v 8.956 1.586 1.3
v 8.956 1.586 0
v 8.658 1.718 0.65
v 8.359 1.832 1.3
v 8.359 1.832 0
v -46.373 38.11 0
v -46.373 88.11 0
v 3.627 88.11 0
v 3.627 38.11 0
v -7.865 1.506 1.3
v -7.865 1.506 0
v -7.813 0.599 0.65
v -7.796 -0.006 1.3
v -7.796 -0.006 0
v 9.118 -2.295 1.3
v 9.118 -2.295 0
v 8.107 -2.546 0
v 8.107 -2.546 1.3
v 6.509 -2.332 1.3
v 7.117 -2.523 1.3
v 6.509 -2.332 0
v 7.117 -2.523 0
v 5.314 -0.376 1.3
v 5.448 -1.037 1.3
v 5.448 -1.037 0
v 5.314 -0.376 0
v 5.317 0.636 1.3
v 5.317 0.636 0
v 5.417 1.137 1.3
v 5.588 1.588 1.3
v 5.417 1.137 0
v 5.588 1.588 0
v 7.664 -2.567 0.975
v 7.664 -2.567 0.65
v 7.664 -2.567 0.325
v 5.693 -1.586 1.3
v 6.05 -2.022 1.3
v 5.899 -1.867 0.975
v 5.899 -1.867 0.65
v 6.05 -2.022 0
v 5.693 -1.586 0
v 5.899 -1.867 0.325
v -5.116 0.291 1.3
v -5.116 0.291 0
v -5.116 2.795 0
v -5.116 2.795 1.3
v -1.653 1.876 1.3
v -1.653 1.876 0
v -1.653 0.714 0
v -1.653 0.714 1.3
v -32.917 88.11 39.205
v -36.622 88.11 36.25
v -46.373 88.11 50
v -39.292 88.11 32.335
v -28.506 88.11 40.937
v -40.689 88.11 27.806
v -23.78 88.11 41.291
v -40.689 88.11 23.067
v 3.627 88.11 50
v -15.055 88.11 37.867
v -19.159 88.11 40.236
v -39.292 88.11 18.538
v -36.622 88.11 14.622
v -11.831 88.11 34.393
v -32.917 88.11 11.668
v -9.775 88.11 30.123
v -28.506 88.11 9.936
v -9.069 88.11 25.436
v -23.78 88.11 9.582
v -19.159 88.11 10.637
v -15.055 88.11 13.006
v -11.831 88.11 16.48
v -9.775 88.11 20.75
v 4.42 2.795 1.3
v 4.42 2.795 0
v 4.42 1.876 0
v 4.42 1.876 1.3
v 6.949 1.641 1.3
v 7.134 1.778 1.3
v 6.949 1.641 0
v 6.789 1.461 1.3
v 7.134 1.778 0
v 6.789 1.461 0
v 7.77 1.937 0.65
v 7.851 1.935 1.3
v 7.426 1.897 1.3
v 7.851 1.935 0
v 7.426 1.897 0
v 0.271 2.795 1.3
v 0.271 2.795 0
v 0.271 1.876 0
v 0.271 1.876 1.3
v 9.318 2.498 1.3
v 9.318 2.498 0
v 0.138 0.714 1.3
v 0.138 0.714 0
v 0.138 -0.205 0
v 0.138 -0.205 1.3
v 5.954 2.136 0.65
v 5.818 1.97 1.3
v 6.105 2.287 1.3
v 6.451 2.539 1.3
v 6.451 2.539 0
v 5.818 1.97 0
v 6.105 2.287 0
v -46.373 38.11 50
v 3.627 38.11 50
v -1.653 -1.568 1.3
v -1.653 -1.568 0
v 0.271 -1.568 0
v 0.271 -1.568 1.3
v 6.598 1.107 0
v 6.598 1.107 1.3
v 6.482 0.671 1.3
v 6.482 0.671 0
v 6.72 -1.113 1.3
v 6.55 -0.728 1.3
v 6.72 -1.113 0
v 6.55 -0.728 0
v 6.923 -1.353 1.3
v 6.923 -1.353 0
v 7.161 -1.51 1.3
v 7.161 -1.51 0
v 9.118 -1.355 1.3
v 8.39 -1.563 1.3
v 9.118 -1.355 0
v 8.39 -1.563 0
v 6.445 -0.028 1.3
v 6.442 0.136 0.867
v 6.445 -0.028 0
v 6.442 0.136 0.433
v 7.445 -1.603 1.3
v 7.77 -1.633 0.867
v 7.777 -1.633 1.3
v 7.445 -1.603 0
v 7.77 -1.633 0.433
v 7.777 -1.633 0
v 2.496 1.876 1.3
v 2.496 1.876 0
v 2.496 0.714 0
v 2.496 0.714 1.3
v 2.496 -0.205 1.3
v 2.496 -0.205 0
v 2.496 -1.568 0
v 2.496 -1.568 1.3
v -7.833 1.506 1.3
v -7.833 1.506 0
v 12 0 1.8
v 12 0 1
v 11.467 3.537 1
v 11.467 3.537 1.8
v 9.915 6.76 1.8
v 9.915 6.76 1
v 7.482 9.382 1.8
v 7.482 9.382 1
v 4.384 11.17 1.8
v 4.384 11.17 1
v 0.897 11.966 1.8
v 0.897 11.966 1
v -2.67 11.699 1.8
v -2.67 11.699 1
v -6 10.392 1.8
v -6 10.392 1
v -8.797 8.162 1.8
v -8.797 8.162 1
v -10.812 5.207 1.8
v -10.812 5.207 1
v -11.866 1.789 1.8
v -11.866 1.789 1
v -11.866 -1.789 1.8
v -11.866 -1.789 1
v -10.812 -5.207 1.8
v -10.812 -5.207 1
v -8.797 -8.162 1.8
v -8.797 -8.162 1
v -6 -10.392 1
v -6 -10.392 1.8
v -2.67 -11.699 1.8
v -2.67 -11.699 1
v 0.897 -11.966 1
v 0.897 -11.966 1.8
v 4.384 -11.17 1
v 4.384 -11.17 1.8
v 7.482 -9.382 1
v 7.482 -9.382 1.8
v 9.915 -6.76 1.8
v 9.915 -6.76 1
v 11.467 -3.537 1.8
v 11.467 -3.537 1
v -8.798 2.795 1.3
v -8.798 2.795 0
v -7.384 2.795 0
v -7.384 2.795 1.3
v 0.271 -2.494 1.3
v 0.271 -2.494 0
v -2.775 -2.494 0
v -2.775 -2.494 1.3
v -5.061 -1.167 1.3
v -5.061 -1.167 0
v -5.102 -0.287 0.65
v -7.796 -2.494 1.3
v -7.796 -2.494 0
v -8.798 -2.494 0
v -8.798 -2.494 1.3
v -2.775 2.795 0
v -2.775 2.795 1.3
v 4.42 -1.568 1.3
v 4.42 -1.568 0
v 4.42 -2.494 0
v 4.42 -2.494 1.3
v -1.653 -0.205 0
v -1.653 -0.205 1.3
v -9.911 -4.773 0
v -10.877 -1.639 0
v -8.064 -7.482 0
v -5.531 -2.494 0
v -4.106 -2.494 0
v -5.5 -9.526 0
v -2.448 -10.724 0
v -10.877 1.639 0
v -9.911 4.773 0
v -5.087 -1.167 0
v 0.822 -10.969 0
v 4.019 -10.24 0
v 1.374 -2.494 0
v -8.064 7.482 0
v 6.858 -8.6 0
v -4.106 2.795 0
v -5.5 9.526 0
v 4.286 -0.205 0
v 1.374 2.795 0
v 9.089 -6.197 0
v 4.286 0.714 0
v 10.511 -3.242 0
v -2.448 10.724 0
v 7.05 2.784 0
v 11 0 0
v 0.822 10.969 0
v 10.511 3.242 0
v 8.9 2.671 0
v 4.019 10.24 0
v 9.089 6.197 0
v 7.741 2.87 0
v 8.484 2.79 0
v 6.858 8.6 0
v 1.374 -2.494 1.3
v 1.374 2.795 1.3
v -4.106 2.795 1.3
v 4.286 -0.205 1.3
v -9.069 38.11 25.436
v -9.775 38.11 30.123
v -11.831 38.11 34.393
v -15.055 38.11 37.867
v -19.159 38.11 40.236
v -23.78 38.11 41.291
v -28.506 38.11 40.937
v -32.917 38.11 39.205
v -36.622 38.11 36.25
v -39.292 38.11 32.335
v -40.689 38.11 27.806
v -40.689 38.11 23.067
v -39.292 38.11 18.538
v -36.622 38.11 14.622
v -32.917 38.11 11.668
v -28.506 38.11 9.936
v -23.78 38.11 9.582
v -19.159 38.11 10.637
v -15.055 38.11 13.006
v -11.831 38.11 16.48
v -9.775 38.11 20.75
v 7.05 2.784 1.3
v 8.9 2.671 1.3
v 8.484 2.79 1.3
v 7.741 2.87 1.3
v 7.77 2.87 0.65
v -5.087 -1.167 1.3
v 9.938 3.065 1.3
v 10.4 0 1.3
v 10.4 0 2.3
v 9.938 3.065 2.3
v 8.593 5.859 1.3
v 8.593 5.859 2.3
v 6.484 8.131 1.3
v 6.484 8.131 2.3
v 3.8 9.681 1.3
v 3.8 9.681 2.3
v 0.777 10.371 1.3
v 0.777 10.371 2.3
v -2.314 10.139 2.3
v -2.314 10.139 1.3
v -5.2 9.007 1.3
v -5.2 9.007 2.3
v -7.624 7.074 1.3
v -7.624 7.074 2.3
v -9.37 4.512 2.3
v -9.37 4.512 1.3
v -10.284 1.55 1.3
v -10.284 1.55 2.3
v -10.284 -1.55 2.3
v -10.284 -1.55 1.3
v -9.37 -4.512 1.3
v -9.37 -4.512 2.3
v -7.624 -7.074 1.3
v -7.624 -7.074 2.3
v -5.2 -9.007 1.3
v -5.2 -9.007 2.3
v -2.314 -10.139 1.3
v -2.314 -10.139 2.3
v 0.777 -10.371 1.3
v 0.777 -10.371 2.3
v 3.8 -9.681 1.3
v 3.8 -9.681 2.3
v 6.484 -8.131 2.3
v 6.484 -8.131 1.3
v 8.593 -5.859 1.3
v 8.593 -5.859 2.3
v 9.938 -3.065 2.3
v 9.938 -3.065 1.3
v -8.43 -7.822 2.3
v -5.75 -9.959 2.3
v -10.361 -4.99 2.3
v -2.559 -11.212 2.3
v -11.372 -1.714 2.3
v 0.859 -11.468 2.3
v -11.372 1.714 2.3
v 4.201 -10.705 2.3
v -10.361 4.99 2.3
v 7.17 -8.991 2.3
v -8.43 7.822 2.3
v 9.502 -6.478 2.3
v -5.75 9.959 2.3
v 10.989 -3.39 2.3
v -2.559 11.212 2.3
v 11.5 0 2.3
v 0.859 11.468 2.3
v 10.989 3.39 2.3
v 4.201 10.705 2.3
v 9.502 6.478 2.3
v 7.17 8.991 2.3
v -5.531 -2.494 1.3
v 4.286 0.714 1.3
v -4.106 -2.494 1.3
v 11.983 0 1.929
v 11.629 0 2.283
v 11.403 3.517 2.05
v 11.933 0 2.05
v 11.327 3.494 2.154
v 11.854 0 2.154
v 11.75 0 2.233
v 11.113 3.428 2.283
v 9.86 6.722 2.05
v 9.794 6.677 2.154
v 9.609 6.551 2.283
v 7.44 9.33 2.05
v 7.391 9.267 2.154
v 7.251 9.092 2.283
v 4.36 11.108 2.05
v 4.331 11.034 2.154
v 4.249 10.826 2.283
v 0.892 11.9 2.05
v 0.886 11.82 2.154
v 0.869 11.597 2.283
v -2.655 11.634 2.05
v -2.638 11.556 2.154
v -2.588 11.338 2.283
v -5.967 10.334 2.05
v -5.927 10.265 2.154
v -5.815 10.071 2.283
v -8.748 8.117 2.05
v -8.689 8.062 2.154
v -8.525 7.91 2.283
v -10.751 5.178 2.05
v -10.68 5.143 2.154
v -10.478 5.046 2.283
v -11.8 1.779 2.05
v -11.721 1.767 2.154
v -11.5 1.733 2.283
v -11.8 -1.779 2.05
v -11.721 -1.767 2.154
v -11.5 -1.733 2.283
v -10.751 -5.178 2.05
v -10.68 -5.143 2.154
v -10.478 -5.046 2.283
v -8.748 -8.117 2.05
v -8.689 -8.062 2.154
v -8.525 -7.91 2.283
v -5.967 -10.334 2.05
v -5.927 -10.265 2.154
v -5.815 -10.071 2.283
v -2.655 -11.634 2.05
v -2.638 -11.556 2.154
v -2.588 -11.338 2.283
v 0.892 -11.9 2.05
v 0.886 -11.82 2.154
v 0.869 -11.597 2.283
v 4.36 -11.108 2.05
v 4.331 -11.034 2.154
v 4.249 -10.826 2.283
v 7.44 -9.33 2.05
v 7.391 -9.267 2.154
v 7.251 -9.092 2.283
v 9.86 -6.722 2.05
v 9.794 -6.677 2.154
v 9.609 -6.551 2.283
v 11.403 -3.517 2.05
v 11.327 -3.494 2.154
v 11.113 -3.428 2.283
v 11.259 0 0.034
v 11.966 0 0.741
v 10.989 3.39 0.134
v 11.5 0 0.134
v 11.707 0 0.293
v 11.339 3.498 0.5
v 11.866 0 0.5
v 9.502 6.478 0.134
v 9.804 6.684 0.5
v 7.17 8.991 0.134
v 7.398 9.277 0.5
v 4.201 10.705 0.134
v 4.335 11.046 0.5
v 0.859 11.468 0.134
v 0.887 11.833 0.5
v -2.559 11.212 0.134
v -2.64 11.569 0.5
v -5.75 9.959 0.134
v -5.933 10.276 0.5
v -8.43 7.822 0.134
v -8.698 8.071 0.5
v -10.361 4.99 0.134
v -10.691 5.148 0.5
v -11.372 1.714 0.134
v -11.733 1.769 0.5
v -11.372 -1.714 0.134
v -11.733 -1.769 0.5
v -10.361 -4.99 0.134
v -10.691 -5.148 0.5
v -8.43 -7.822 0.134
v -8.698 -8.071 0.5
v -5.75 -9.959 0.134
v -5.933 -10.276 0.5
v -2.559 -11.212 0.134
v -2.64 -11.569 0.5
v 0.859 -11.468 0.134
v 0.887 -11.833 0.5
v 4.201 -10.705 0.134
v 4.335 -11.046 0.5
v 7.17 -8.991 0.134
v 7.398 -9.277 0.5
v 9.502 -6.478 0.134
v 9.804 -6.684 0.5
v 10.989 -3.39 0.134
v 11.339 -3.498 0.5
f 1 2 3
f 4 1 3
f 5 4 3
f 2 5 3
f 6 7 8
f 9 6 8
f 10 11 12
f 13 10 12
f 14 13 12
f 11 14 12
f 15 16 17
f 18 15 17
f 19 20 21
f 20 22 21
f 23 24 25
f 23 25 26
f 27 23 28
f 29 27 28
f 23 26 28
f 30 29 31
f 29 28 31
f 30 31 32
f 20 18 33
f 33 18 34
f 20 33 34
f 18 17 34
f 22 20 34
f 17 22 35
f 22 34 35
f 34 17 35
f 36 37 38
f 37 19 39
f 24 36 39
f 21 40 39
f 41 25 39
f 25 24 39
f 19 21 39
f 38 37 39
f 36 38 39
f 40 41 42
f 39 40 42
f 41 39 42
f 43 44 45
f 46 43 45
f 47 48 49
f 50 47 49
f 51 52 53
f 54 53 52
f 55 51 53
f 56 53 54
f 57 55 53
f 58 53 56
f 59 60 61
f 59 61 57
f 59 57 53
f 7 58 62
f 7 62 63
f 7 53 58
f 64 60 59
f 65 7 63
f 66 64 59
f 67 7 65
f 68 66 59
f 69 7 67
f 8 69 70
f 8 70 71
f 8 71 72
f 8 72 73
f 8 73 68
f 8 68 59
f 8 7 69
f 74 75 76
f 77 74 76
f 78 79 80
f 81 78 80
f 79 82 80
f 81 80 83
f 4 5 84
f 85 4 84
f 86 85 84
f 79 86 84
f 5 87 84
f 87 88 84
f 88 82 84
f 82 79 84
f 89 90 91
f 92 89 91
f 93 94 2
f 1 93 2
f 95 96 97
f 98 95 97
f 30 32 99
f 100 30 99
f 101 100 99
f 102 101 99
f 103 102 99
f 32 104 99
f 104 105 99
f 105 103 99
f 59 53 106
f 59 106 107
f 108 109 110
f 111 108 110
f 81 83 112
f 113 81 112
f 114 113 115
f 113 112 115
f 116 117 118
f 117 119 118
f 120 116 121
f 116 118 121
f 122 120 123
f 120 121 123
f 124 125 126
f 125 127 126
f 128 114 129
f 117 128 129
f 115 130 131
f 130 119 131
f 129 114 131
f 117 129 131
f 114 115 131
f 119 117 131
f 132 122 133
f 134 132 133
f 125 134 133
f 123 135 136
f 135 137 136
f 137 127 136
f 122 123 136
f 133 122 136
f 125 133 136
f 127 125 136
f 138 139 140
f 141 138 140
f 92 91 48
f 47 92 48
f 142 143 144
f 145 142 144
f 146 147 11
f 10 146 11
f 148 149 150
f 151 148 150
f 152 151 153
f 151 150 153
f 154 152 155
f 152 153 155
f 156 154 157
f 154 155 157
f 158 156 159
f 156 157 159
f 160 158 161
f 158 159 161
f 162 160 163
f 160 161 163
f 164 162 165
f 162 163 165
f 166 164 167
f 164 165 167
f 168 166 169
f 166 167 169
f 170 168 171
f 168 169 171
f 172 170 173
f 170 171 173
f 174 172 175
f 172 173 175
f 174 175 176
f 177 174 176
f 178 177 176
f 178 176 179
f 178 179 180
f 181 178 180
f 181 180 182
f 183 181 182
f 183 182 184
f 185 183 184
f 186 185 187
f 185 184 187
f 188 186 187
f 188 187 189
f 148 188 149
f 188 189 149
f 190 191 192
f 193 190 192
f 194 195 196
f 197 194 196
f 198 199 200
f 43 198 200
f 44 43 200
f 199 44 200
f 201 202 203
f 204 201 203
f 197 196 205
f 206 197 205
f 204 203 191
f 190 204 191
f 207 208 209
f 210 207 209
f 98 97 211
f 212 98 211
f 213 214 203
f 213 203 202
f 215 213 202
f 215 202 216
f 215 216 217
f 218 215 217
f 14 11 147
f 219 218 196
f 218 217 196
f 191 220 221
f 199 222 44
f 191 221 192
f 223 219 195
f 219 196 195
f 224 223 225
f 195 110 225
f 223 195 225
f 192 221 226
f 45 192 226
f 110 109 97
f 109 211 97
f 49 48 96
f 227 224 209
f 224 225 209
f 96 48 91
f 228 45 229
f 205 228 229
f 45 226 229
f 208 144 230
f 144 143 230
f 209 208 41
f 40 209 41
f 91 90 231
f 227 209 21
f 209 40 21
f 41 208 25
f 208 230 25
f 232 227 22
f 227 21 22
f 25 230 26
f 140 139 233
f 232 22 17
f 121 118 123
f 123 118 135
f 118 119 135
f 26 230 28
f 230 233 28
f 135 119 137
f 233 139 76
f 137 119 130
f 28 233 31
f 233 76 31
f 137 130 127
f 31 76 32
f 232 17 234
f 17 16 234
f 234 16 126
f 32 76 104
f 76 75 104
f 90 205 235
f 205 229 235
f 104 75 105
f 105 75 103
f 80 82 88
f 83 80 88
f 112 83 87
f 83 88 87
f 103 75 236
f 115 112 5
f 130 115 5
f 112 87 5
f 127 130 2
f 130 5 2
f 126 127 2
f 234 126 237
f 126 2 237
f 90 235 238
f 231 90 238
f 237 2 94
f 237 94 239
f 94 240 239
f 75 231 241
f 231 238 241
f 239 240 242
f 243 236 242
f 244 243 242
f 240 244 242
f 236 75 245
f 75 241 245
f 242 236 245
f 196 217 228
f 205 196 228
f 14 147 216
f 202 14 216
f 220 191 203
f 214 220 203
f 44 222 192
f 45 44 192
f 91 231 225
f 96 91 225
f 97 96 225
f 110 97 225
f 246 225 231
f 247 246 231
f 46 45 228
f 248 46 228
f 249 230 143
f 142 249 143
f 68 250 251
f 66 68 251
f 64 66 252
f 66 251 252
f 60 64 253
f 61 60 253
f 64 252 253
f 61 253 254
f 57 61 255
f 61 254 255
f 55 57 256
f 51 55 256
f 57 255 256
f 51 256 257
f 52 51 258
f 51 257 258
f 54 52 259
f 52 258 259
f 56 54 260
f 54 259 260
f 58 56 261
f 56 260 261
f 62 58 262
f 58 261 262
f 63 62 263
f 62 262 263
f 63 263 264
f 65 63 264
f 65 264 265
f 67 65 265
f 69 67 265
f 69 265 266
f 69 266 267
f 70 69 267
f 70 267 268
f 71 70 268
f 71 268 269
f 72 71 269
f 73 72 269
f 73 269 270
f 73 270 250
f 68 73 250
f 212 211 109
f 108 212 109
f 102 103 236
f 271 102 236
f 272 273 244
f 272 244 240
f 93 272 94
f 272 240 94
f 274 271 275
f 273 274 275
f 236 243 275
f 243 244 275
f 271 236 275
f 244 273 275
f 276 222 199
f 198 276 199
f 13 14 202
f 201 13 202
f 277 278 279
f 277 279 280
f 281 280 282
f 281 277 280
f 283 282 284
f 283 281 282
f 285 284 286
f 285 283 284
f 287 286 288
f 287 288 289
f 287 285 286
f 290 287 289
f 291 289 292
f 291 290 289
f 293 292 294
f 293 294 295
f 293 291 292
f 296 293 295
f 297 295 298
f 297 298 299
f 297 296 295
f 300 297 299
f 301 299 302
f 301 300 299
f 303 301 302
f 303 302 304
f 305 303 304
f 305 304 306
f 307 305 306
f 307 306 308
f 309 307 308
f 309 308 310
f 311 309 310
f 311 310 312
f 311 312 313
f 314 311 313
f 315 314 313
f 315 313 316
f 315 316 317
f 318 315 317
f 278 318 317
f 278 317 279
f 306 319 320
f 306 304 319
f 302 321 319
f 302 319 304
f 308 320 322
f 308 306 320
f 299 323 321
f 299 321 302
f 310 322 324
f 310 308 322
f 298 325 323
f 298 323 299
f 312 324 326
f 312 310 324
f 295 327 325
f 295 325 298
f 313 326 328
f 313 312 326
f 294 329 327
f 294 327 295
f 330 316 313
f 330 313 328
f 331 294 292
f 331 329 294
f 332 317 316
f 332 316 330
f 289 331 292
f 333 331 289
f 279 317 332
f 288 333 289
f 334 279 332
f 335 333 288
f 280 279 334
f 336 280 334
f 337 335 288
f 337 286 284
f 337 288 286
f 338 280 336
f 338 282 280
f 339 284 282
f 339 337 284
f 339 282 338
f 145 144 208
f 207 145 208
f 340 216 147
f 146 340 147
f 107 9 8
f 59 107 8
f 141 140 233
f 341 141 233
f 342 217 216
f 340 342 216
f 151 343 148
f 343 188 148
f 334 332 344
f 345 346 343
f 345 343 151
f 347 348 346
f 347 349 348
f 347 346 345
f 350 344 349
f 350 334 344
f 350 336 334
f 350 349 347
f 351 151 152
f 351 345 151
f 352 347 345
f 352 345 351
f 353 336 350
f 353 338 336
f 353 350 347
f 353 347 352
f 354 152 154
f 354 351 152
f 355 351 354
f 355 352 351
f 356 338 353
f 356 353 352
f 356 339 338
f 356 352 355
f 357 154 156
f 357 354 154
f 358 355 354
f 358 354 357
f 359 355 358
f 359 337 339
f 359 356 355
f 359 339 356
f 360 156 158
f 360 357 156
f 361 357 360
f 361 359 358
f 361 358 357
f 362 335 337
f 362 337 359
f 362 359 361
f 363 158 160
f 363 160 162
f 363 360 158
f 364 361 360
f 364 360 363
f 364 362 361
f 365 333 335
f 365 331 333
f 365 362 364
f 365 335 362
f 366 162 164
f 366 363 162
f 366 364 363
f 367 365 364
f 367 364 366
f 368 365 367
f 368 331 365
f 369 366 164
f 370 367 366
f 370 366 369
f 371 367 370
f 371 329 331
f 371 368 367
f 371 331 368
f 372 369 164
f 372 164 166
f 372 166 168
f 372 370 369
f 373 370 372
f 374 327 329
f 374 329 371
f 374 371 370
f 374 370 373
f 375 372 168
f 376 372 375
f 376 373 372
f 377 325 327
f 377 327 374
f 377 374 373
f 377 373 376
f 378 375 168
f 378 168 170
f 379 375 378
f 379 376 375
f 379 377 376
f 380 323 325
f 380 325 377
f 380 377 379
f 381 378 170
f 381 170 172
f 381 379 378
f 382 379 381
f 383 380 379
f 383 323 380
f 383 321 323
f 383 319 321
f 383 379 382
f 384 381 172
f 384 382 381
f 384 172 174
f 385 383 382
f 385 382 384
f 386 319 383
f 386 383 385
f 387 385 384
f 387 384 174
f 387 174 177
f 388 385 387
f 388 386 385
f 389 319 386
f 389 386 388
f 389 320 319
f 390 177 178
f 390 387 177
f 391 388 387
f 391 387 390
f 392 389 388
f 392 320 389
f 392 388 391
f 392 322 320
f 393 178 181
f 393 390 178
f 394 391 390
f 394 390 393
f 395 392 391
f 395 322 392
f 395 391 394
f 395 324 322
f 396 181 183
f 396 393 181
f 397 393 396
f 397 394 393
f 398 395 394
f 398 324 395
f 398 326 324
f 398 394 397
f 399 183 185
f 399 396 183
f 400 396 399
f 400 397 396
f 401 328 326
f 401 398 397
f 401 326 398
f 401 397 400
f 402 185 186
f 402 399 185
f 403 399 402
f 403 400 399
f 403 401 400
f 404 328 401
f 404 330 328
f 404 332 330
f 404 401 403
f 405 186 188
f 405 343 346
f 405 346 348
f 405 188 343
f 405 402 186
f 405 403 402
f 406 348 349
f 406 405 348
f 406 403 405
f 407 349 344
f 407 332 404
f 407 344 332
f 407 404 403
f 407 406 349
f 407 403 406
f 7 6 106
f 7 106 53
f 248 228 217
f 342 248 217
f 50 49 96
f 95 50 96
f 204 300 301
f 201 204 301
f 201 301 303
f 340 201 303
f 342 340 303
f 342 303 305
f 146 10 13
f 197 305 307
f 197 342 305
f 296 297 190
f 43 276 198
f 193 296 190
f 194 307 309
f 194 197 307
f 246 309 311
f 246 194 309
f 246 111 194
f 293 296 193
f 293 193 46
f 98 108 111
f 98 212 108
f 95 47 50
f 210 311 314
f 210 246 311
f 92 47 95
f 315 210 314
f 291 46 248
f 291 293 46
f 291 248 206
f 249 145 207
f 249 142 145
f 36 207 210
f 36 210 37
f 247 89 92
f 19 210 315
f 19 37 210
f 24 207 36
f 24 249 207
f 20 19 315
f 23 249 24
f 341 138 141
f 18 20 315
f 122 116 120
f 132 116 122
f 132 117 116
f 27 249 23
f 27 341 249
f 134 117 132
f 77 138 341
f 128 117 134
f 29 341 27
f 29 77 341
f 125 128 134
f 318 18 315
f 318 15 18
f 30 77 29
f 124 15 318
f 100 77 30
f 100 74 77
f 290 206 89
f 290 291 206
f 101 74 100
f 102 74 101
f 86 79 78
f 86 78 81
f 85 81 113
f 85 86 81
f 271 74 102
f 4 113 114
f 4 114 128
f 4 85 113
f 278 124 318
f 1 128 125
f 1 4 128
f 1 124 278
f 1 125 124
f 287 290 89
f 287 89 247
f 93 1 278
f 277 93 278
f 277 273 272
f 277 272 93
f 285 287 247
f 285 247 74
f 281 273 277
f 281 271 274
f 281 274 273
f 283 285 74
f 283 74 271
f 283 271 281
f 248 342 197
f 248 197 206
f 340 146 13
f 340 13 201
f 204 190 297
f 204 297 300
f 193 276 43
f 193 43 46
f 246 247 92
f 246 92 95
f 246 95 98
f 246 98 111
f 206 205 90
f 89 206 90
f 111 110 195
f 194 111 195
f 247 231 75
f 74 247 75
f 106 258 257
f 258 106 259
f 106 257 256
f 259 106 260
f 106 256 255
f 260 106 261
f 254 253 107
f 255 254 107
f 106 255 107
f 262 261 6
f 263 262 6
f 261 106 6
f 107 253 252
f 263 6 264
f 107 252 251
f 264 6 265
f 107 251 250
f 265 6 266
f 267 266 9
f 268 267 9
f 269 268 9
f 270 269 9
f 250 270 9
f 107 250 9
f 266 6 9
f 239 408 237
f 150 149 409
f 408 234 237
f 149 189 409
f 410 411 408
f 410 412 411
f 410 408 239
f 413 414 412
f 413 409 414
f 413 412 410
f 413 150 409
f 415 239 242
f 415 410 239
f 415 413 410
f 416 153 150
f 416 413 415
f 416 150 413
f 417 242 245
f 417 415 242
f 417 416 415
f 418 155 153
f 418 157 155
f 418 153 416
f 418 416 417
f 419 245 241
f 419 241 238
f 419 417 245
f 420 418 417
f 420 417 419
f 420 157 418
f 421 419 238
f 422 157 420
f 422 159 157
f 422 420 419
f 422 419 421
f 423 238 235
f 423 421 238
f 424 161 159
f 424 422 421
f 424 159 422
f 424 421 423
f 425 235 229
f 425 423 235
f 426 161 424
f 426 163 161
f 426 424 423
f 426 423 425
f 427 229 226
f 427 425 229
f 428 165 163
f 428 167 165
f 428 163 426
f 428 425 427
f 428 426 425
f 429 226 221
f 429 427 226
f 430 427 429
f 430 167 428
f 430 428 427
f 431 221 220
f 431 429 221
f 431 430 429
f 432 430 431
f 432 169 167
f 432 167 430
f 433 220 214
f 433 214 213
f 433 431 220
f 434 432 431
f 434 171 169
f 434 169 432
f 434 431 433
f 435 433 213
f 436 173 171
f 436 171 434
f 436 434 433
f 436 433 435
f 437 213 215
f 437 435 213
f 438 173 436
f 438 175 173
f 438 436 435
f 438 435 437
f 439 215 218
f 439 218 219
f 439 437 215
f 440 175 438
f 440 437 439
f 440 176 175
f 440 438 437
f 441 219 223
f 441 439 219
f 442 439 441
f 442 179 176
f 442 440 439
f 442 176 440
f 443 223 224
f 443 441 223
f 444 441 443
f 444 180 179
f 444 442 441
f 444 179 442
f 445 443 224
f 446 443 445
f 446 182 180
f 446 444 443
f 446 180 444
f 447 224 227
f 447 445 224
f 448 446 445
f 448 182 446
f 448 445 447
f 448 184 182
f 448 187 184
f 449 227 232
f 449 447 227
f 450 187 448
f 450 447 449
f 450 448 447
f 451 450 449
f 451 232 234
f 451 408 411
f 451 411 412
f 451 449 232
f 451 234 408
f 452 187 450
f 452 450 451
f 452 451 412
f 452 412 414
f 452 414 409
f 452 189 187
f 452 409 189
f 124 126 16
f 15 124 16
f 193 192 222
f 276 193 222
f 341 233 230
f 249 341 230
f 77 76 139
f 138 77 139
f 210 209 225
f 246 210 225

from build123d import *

# Parameters (mm, degrees)
F0_R     = 12
F0_R_2   = 10.4
F1_DEPTH = 2.3
F2_DEPTH = 1.3
F3_R     = 1
F4_R     = 0.5
F5_W     = 50
F5_H     = 50
F6_DEPTH = 50
F7_R     = 15.8989374397
F8_DEPTH = 100


with BuildPart() as f1:
    # F0 (on Top) → F1 (new body)
    with BuildSketch(Plane.XY):
        Circle(F0_R)
        Circle(F0_R_2, mode=Mode.SUBTRACT)
    extrude(amount=F1_DEPTH)

    # F0 (on Top) → F2 (join)
    with BuildSketch(Plane.XY):
        Circle(F0_R_2)
        with BuildLine():
            Line((-4.106343837, 2.7947281366), (-4.106343837, -2.4944755714))
            Line((-4.106343837, -2.4944755714), (-5.5313842758, -2.4944755714))
            Line((-5.5313842758, -2.4944755714), (-7.8327493385, 1.5062878374))
            Line((-7.8327493385, 1.5062878374), (-7.8651629309, 1.5062878374))
            add(Edge.make_bspline(
                [(-7.8651629309, 1.5062878374), (-7.7957052328, 0.4470579418), (-7.7957052328, -0.0055747239)],
                knots=[0, 0, 0, 1, 1, 1], degree=2))
            Line((-7.7957052328, -0.0055747239), (-7.7957052328, -2.4944755714))
            Line((-7.7957052328, -2.4944755714), (-8.7982113417, -2.4944755714))
            Line((-8.7982113417, -2.4944755714), (-8.7982113417, 2.7947281366))
            Line((-8.7982113417, 2.7947281366), (-7.3835895576, 2.7947281366))
            Line((-7.3835895576, 2.7947281366), (-5.0868550081, -1.16667591))
            Line((-5.0868550081, -1.16667591), (-5.0613871855, -1.16667591))
            add(Edge.make_bspline(
                [(-5.0613871855, -1.16667591), (-5.1157957156, -0.1352290937), (-5.1157957156, 0.2907781212)],
                knots=[0, 0, 0, 1, 1, 1], degree=2))
            Line((-5.1157957156, 0.2907781212), (-5.1157957156, 2.7947281366))
            Line((-5.1157957156, 2.7947281366), (-4.106343837, 2.7947281366))
        make_face(mode=Mode.SUBTRACT)
        Polygon((0.2706487697, -1.5683729305), (0.2706487697, -2.4944755714), (-2.7750712907, -2.4944755714), (-2.7750712907, 2.7947281366), (0.2706487697, 2.7947281366), (0.2706487697, 1.8755712655), (-1.6533294668, 1.8755712655), (-1.6533294668, 0.7144700794), (0.1375215151, 0.7144700794), (0.1375215151, -0.2046867917), (-1.6533294668, -0.2046867917), (-1.6533294668, -1.5683729305), align=None, mode=Mode.SUBTRACT)
        Polygon((4.4195886011, -1.5683729305), (4.4195886011, -2.4944755714), (1.3738685407, -2.4944755714), (1.3738685407, 2.7947281366), (4.4195886011, 2.7947281366), (4.4195886011, 1.8755712655), (2.4956103646, 1.8755712655), (2.4956103646, 0.7144700794), (4.2864613465, 0.7144700794), (4.2864613465, -0.2046867917), (2.4956103646, -0.2046867917), (2.4956103646, -1.5683729305), align=None, mode=Mode.SUBTRACT)
        with BuildLine():
            add(Edge.make_bspline(
                [(8.35899771, 1.8321602042), (8.05917198, 1.9369255654), (7.7697649047, 1.9369255654)],
                knots=[0, 0, 0, 1, 1, 1], degree=2))
            add(Edge.make_bspline(
                [(7.7697649047, 1.9369255654), (7.1365422239, 1.9369255654), (6.7892537336, 1.4611403337)],
                knots=[0, 0, 0, 1, 1, 1], degree=2))
            add(Edge.make_bspline(
                [(6.7892537336, 1.4611403337), (6.4419652432, 0.9853551019), (6.4419652432, 0.1356559288)],
                knots=[0, 0, 0, 1, 1, 1], degree=2))
            add(Edge.make_bspline(
                [(6.4419652432, 0.1356559288), (6.4419652432, -1.6332001154), (7.7697649047, -1.6332001154)],
                knots=[0, 0, 0, 1, 1, 1], degree=2))
            add(Edge.make_bspline(
                [(7.7697649047, -1.6332001154), (8.3265841175, -1.6332001154), (9.1184018755, -1.3553693231)],
                knots=[0, 0, 0, 1, 1, 1], degree=2))
            Line((9.1184018755, -1.3553693231), (9.1184018755, -2.2953635036))
            add(Edge.make_bspline(
                [(9.1184018755, -2.2953635036), (8.4678147703, -2.5674061544), (7.6644207293, -2.5674061544)],
                knots=[0, 0, 0, 1, 1, 1], degree=2))
            add(Edge.make_bspline(
                [(7.6644207293, -2.5674061544), (6.510265313, -2.5674061544), (5.89903757, -1.8670410322)],
                knots=[0, 0, 0, 1, 1, 1], degree=2))
            add(Edge.make_bspline(
                [(5.89903757, -1.8670410322), (5.287809827, -1.16667591), (5.287809827, 0.1426016986)],
                knots=[0, 0, 0, 1, 1, 1], degree=2))
            add(Edge.make_bspline(
                [(5.287809827, 0.1426016986), (5.287809827, 0.9679906774), (5.5882143711, 1.5884794468)],
                knots=[0, 0, 0, 1, 1, 1], degree=2))
            add(Edge.make_bspline(
                [(5.5882143711, 1.5884794468), (5.8886189153, 2.2089682162), (6.4512262696, 2.5394710962)],
                knots=[0, 0, 0, 1, 1, 1], degree=2))
            add(Edge.make_bspline(
                [(6.4512262696, 2.5394710962), (7.013833624, 2.8699739762), (7.7697649047, 2.8699739762)],
                knots=[0, 0, 0, 1, 1, 1], degree=2))
            add(Edge.make_bspline(
                [(7.7697649047, 2.8699739762), (8.539587725, 2.8699739762), (9.3175139433, 2.4983752915)],
                knots=[0, 0, 0, 1, 1, 1], degree=2))
            Line((9.3175139433, 2.4983752915), (8.9563339134, 1.5861641902))
            add(Edge.make_bspline(
                [(8.9563339134, 1.5861641902), (8.65882344, 1.7273948429), (8.35899771, 1.8321602042)],
                knots=[0, 0, 0, 1, 1, 1], degree=2))
        make_face(mode=Mode.SUBTRACT)
    extrude(amount=F2_DEPTH)

    # F3
    f3_edges = [f1.edges().sort_by_distance(p)[0] for p in [
        (-12, 0, 0),
    ]]
    fillet(f3_edges, radius=F3_R)

    # F4
    f4_edges = [f1.edges().sort_by_distance(p)[0] for p in [
        (-12, 0, 2.3),
    ]]
    fillet(f4_edges, radius=F4_R)


with BuildPart() as f6:
    # F5 (on Top) → F6 (new body)
    with BuildSketch(Plane.XY):
        with Locations((-21.373128891, 63.1102785468)):
            Rectangle(F5_W, F5_H)
    extrude(amount=F6_DEPTH)

    # F7 (on face) → F8 (cut)
    with BuildSketch(Plane.XZ.offset(-38.1102785468)):
        with Locations((-24.9677170068, 25.4364721477)):
            Circle(F7_R)
    extrude(amount=-F8_DEPTH, mode=Mode.SUBTRACT)


solid = Compound([f1.part, f6.part])
